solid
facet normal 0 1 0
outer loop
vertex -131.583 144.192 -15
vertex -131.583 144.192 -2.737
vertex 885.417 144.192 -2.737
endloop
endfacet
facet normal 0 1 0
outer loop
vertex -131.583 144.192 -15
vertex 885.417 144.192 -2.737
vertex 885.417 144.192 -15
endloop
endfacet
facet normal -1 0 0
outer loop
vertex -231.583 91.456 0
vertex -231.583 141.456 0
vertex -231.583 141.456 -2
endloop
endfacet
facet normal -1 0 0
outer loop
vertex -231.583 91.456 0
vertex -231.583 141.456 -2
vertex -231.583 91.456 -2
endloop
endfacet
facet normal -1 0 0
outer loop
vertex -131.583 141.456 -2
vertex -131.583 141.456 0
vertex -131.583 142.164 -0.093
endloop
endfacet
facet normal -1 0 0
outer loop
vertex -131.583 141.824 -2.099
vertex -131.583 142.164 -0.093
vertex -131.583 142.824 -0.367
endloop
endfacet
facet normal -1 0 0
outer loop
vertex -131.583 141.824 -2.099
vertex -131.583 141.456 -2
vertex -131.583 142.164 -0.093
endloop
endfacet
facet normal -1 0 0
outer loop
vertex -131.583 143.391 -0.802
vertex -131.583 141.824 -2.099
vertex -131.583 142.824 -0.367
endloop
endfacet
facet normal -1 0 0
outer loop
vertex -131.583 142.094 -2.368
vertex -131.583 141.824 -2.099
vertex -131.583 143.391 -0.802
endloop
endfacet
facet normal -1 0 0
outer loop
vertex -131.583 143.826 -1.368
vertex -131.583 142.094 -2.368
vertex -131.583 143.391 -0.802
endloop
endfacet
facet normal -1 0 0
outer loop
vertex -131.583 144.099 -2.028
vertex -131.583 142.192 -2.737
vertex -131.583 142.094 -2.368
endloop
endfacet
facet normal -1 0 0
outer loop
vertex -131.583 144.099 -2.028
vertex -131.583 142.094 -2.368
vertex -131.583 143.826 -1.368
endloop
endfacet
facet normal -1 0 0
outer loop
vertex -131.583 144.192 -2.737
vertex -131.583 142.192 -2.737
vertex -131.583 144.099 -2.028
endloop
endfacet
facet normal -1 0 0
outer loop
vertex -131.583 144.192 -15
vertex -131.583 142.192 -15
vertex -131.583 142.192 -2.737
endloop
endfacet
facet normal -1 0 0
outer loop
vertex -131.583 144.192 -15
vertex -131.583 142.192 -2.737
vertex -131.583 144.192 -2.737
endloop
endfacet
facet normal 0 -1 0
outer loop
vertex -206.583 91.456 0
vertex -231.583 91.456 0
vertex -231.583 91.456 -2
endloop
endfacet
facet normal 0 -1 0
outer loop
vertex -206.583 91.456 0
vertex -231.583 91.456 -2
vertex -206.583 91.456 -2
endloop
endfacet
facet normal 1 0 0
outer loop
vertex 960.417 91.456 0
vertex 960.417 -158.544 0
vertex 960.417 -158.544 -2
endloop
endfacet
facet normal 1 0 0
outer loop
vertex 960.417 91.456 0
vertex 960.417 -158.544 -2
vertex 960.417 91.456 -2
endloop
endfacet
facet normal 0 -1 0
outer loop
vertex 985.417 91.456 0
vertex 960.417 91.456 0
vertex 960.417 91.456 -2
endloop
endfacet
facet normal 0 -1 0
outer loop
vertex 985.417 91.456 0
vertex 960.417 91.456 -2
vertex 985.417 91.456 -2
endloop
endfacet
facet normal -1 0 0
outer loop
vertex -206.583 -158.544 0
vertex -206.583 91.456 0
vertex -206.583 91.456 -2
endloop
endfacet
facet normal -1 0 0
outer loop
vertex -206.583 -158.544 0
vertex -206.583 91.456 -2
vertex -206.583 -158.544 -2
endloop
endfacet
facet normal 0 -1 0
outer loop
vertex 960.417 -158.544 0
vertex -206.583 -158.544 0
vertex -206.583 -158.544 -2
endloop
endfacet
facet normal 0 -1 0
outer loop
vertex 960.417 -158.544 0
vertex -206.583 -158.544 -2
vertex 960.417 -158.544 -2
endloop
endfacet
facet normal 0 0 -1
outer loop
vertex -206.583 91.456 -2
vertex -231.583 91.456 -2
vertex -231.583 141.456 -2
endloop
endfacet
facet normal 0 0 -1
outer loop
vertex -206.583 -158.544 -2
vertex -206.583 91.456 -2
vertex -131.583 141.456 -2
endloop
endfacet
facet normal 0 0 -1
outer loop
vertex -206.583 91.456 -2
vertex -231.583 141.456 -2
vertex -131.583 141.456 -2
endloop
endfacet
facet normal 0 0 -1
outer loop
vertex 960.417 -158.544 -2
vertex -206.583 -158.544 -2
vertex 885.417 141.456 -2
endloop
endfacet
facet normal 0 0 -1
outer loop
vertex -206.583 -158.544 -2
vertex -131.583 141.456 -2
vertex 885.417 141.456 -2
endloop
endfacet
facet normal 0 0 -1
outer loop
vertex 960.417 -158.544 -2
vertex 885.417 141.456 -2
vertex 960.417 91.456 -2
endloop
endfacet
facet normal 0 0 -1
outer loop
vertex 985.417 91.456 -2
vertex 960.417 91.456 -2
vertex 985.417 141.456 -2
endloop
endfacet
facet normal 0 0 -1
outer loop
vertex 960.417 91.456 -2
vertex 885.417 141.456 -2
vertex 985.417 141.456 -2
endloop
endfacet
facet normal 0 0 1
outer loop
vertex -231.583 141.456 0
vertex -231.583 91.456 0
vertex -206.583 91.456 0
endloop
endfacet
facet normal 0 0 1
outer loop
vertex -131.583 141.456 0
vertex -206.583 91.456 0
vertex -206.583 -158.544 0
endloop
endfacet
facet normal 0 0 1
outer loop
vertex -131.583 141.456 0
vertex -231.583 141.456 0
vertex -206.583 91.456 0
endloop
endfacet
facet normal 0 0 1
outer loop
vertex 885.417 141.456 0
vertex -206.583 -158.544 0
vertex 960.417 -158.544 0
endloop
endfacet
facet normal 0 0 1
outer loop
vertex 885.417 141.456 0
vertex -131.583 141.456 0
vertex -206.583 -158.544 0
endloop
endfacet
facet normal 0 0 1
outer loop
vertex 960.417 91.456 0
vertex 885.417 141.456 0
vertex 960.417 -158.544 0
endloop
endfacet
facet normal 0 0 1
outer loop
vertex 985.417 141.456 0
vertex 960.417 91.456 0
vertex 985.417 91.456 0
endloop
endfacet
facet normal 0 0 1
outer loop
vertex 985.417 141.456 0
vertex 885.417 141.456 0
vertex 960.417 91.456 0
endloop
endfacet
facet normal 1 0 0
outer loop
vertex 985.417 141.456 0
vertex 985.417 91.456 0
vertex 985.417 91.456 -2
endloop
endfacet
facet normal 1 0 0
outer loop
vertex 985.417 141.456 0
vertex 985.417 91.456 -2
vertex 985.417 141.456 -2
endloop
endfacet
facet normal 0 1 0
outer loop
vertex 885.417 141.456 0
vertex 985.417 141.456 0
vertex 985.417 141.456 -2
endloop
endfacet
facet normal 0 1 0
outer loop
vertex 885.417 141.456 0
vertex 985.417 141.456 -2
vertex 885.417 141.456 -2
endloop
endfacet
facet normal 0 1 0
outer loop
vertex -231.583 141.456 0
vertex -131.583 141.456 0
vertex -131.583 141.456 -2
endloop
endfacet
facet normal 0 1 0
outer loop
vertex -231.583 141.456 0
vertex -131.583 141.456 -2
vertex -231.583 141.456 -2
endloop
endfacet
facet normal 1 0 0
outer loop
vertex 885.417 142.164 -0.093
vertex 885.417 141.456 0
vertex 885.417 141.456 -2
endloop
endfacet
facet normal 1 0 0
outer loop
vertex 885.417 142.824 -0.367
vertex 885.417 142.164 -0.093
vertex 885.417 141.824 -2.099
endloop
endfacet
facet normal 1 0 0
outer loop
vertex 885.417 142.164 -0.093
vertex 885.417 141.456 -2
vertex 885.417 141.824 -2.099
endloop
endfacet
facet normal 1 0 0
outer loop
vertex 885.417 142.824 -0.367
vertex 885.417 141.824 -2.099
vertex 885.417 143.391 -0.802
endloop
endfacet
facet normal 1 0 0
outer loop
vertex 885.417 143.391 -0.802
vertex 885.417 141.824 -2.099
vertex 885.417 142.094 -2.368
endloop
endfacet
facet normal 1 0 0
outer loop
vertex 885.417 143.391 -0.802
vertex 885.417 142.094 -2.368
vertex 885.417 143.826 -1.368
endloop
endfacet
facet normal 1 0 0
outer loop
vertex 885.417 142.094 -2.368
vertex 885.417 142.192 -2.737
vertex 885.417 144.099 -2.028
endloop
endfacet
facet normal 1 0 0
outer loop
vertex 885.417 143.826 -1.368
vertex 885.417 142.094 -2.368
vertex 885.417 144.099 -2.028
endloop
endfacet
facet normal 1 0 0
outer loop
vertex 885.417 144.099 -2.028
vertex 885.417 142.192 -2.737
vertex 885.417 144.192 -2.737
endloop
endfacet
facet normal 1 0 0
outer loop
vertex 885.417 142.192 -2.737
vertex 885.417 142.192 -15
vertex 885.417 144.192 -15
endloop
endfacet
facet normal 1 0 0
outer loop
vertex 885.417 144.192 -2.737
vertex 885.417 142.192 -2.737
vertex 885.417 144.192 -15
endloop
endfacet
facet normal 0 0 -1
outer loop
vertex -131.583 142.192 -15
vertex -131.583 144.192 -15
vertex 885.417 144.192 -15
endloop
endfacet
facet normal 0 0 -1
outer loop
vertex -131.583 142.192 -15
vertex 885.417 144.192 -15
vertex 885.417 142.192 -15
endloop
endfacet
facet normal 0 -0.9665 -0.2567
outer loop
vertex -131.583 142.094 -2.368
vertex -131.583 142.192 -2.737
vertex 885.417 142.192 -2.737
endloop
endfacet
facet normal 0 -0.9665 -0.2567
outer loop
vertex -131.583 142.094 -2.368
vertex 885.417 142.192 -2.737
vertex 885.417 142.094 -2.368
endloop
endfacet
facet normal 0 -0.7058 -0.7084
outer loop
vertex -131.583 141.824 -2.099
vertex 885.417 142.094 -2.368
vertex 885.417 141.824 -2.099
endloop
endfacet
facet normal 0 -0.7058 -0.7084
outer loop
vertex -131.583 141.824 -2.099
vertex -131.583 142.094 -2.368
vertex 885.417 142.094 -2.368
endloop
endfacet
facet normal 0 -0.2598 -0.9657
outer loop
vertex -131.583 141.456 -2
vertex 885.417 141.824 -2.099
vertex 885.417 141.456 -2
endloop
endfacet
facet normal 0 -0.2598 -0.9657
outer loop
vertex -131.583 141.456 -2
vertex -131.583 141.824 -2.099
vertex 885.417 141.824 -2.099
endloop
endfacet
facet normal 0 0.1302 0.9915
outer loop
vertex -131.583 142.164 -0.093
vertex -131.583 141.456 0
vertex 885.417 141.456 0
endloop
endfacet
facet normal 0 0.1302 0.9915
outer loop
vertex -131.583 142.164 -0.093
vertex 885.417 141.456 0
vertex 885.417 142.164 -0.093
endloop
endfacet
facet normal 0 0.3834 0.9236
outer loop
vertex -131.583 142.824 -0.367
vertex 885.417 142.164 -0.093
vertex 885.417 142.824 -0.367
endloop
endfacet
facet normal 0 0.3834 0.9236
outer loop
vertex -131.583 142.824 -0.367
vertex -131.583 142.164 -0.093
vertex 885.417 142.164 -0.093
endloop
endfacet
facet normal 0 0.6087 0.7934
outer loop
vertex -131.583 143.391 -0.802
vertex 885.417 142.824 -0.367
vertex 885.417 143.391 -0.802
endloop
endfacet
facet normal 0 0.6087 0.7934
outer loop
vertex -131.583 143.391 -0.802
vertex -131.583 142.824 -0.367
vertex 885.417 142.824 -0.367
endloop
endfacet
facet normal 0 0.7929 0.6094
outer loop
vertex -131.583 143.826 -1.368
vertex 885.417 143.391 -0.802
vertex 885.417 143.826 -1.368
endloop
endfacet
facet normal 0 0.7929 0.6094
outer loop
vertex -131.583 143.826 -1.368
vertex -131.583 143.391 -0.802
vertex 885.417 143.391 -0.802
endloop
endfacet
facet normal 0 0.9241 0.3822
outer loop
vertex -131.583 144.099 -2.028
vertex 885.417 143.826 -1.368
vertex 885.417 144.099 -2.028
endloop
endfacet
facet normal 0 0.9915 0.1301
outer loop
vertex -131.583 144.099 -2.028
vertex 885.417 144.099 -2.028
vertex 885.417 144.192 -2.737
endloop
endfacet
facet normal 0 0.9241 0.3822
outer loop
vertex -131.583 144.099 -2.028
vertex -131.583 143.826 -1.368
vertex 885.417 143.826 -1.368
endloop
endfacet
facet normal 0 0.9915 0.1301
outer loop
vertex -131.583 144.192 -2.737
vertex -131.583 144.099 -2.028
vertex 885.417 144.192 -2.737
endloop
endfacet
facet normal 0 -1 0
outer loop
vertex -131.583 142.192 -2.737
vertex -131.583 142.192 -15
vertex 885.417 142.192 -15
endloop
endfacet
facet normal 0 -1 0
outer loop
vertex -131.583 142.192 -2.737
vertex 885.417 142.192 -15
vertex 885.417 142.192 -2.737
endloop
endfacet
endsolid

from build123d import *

# Parameters (mm, degrees)
BASE_FLANGE1_DEPTH = 2
EDGE_FLANGE1_DEPTH = 1017


# Sheet-metal steps are written as plain solids
with BuildPart() as part:
    # Sketch1 → Base-Flange1 (new body)
    with BuildSketch(Plane.XY):
        Polygon((960.416808149, 91.455857385), (985.416808149, 91.455857385), (985.416808149, 141.455857385), (-231.583191851, 141.455857385), (-231.583191851, 91.455857385), (-206.583191851, 91.455857385), (-206.583191851, -158.544142615), (960.416808149, -158.544142615), align=None)
    extrude(amount=-BASE_FLANGE1_DEPTH)

    # Edge-Flange1 section (across the edge) → Edge-Flange1 (add)
    with BuildSketch(Plane(origin=(-131.583191851, 142.192457385, -2), x_dir=(0, -1, 0), z_dir=(1, 0, 0))):
        with BuildLine():
            Line((-2, 0.7366), (-2, 13))
            Line((-2, 13), (0, 13))
            Line((0, 13), (0, 0.7366))
            ThreePointArc((0, 0.7366), (0.215745145, 0.215745145), (0.7366, 0))
            Line((0.7366, 0), (0.7366, -2))
            ThreePointArc((0.7366, -2), (-1.198468417, -1.198468417), (-2, 0.7366))
        make_face()
    extrude(amount=EDGE_FLANGE1_DEPTH)


solid = part.part
